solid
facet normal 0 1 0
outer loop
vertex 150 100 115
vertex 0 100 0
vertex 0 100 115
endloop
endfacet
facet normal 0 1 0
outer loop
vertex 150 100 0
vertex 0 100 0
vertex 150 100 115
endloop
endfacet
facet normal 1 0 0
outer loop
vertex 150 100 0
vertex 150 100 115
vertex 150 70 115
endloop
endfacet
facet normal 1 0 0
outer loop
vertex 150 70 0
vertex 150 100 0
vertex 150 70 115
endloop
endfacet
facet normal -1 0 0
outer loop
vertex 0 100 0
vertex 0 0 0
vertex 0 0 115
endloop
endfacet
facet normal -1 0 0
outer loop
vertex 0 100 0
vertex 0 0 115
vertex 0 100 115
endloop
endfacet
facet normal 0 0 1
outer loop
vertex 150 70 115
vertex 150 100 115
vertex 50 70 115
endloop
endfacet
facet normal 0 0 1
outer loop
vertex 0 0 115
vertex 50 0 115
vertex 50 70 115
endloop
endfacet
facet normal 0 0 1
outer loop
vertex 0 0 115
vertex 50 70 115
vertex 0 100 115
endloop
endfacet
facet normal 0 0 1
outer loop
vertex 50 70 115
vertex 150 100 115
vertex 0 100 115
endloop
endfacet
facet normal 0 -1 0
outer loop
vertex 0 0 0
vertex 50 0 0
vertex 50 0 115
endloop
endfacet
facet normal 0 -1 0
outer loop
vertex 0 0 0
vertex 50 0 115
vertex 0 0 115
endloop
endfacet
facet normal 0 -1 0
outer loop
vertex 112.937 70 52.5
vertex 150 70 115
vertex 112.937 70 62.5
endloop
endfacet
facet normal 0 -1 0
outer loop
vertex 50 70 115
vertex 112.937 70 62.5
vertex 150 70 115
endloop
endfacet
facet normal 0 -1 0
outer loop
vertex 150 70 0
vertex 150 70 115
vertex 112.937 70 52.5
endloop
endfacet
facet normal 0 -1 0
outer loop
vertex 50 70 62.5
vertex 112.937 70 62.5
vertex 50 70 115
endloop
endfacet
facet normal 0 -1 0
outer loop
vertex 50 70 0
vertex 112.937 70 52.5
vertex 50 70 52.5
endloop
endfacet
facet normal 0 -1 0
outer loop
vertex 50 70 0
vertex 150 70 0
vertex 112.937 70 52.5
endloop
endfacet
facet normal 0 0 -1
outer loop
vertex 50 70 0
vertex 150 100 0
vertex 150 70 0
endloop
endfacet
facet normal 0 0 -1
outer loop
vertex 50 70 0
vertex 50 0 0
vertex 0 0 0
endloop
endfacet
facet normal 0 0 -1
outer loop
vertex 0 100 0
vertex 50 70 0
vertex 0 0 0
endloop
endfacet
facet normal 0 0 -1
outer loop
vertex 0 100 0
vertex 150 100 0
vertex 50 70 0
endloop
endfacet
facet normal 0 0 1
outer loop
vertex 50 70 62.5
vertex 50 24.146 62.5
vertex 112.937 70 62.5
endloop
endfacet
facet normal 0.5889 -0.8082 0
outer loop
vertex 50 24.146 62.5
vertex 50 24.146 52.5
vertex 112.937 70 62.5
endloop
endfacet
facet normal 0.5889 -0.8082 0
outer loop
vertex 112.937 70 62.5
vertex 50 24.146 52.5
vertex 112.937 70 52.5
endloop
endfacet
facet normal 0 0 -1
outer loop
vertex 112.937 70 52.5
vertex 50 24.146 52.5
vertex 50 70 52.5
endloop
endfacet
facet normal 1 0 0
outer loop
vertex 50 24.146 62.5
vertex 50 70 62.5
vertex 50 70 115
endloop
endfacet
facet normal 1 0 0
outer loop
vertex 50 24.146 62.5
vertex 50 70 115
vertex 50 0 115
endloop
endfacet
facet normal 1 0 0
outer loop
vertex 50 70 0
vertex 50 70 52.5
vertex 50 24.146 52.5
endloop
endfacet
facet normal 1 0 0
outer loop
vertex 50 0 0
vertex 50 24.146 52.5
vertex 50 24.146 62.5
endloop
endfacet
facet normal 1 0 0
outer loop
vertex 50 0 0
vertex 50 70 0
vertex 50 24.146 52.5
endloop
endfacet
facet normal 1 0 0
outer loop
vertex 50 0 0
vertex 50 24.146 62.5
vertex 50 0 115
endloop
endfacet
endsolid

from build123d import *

# Parameters (mm, degrees)
BOSS_EXTRUDE1_DEPTH = 115
RIB1_REACH          = 191.225
SKETCH2_WALL_W      = 510.73669158
SKETCH2_WALL_H      = 10


with BuildPart() as part:
    # Sketch1 → Boss-Extrude1 (new body)
    with BuildSketch(Plane.XY):
        Polygon((0, 0), (0, 100), (150, 100), (150, 70), (50, 70), (50, 0), align=None)
    extrude(amount=BOSS_EXTRUDE1_DEPTH)

    # Sketch2 wall → Rib1 (add, up to next)
    with BuildSketch(Plane(origin=(78.259342081, 44.734908946, 57.5), x_dir=(0.80823649623, 0.588858018679, 0), z_dir=(-0.588858018679, 0.80823649623, 0)), mode=Mode.PRIVATE) as rib1_sk1:
        Rectangle(SKETCH2_WALL_W, SKETCH2_WALL_H)
    rib1_tool1 = extrude(rib1_sk1.sketch, amount=RIB1_REACH, mode=Mode.PRIVATE) - part.part
    add(rib1_tool1.solids().sort_by_distance((78.259342081, 44.734908946, 57.5))[0])


solid = part.part
